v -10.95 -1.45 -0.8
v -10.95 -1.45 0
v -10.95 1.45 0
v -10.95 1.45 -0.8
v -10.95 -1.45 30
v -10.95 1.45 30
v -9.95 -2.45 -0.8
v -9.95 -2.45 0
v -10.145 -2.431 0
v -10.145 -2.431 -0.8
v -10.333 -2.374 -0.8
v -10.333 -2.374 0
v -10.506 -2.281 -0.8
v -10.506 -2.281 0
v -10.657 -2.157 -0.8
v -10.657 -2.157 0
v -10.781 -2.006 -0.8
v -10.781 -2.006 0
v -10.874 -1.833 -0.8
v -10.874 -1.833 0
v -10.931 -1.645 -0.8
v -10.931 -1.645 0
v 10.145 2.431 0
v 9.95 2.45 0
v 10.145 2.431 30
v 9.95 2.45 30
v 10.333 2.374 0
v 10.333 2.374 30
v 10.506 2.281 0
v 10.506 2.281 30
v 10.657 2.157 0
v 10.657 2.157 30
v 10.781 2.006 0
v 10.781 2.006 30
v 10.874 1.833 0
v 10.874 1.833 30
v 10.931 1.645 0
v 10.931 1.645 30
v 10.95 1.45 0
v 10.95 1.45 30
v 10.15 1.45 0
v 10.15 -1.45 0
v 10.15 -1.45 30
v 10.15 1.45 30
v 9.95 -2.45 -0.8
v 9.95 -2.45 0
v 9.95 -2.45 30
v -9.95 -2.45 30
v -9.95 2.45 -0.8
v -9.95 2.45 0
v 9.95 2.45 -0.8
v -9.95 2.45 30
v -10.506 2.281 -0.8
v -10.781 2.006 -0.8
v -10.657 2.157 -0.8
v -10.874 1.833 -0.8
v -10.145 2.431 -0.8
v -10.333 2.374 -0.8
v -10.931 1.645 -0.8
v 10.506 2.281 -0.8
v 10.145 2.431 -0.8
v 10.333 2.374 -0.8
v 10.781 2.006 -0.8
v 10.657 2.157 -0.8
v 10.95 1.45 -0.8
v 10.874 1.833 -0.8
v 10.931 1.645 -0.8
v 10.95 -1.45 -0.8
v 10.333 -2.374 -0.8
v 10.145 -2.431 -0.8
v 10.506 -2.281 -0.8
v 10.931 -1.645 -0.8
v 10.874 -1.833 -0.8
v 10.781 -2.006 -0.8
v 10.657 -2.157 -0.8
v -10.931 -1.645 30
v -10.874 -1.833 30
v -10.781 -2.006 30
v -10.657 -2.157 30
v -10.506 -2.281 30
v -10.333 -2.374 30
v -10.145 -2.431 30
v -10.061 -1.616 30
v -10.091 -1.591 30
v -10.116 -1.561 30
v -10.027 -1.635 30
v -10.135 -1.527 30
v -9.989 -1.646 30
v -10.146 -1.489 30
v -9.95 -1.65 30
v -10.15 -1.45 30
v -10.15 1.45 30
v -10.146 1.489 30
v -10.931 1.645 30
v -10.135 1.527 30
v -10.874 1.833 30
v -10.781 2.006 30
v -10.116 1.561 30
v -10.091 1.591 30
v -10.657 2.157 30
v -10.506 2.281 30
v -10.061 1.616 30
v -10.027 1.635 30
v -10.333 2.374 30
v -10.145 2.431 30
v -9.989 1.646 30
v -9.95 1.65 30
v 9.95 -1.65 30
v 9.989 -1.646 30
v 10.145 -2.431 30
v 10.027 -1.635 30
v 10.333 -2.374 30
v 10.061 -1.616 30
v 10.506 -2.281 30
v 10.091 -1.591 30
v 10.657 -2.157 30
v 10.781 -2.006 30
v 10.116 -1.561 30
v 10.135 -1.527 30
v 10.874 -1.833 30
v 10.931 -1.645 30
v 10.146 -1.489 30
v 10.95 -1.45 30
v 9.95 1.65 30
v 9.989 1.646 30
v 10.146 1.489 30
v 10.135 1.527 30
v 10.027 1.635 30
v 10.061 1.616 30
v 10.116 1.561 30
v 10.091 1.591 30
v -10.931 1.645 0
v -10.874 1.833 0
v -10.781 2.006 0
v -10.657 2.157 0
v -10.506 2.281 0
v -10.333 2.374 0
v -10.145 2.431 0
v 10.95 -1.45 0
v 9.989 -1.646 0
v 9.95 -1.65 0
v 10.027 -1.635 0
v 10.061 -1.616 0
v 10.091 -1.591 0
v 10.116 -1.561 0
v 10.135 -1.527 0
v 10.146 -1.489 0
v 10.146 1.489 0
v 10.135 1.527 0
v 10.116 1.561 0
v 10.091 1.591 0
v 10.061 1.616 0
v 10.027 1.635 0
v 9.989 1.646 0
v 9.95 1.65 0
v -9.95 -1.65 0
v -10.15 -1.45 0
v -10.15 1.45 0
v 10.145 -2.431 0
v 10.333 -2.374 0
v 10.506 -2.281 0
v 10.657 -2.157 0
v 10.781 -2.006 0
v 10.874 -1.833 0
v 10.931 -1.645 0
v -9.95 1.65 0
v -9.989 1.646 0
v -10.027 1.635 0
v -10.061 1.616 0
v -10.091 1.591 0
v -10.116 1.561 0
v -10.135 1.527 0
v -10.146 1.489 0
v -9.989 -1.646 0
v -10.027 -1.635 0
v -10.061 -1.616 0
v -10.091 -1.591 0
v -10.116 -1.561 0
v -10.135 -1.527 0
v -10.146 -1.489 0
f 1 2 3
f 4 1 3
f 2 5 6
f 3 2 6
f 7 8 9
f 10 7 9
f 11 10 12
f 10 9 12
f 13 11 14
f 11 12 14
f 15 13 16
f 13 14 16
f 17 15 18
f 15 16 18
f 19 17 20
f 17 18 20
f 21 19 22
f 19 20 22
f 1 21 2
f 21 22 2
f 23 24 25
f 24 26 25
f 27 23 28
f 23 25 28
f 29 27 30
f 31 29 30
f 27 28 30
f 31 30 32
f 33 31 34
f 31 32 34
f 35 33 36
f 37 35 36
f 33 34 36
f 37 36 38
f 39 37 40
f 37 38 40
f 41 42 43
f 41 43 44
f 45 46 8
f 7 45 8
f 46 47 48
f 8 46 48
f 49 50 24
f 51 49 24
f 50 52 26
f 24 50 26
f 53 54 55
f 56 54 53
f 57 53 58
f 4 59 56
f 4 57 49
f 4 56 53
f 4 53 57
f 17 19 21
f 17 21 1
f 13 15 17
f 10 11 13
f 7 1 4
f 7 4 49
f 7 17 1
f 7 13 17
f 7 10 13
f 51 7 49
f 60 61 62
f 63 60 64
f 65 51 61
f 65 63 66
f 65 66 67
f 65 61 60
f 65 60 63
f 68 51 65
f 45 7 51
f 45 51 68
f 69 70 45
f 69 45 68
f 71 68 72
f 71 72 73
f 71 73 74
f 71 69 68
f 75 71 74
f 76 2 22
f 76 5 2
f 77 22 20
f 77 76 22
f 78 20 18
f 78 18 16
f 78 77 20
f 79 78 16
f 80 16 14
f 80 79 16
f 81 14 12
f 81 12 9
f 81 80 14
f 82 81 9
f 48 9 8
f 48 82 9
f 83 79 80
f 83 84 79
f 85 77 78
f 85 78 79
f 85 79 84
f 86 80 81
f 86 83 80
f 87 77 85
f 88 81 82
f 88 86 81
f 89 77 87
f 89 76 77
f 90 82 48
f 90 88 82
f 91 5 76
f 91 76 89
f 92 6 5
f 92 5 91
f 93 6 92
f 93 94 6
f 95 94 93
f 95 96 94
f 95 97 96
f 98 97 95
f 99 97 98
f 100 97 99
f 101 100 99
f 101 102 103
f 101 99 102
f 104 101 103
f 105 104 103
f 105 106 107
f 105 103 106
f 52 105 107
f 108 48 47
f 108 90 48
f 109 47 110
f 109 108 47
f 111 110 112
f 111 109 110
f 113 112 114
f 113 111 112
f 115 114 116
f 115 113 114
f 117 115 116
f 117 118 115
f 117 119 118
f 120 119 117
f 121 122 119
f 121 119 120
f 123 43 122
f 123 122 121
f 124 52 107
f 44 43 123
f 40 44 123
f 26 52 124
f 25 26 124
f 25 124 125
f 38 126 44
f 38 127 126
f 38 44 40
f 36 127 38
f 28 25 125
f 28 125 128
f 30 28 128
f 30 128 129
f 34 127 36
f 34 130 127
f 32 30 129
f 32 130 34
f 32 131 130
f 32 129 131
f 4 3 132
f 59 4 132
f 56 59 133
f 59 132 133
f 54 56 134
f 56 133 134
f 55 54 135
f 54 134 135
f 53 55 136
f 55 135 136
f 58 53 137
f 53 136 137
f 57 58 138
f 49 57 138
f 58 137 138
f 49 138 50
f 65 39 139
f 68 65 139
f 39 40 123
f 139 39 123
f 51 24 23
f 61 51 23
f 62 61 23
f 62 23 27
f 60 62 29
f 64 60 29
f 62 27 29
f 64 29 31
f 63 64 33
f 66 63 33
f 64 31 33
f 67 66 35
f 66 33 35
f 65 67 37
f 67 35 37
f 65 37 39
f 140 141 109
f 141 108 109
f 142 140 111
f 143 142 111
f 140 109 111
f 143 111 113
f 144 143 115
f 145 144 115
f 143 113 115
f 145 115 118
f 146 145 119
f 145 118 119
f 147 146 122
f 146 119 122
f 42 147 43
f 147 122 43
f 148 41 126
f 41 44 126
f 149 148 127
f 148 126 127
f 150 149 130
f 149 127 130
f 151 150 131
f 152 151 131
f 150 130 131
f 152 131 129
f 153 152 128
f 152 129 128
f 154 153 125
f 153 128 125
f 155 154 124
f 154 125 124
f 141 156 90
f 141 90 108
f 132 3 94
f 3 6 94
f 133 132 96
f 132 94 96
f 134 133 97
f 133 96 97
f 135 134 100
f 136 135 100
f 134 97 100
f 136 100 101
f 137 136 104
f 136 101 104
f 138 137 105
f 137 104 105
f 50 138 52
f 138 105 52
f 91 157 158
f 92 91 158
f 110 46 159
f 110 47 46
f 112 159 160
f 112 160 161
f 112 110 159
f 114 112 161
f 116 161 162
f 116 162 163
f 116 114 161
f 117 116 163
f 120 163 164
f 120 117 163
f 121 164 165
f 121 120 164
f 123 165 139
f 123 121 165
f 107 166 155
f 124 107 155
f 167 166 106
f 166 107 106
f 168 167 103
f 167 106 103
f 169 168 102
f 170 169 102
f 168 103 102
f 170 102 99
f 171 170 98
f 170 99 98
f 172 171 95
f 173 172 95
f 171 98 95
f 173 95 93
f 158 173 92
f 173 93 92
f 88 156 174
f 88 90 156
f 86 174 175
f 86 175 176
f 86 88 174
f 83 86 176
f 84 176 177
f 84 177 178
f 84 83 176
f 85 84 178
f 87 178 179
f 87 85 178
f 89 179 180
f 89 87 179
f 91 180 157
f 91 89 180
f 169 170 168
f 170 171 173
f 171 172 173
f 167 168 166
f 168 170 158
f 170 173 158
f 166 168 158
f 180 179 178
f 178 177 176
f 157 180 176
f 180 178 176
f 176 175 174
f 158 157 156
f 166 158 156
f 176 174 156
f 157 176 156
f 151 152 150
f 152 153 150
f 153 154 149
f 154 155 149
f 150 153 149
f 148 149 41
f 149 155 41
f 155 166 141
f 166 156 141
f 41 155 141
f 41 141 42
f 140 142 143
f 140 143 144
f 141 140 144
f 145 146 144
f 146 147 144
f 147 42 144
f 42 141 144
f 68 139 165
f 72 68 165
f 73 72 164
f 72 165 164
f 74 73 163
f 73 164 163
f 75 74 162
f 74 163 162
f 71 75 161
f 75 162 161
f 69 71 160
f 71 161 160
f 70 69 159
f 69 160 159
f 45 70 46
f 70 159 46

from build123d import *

# Parameters (mm, degrees)
F0_W     = 21.9
F0_H     = 4.9
F0_W_2   = 20.3
F0_H_2   = 3.3
F1_DEPTH = 30
F2_R     = 0.2
F3_R     = 1
F5_DEPTH = 0.8


with BuildPart() as f1:
    # F0 (on Top) → F1 (new body)
    with BuildSketch(Plane.XY):
        Rectangle(F0_W, F0_H)
        Rectangle(F0_W_2, F0_H_2, mode=Mode.SUBTRACT)
    extrude(amount=F1_DEPTH)

    # F2
    f2_edges = [f1.edges().sort_by_distance(p)[0] for p in [
        (-10.15, -1.65, 15),
        (10.15, 1.65, 15),
        (10.15, -1.65, 15),
        (-10.15, 1.65, 15),
    ]]
    fillet(f2_edges, radius=F2_R)

    # F3
    f3_edges = [f1.edges().sort_by_distance(p)[0] for p in [
        (10.95, -2.45, 15),
        (10.95, 2.45, 15),
        (-10.95, -2.45, 15),
        (-10.95, 2.45, 15),
    ]]
    fillet(f3_edges, radius=F3_R)

    # F4 (on face) → F5 (join)
    with BuildSketch(Plane(origin=(0, 0, 0), x_dir=(1, 0, 0), z_dir=(0, 0, -1))):
        with BuildLine():
            ThreePointArc((10.95, 1.45), (10.657107, 2.157107), (9.95, 2.45))
            Line((9.95, 2.45), (-9.95, 2.45))
            ThreePointArc((-9.95, 2.45), (-10.657107, 2.157107), (-10.95, 1.45))
            Line((-10.95, 1.45), (-10.95, -1.45))
            ThreePointArc((-10.95, -1.45), (-10.657107, -2.157107), (-9.95, -2.45))
            Line((-9.95, -2.45), (9.95, -2.45))
            ThreePointArc((9.95, -2.45), (10.657107, -2.157107), (10.95, -1.45))
            Line((10.95, -1.45), (10.95, 1.45))
        make_face()
    extrude(amount=F5_DEPTH)


solid = f1.part
